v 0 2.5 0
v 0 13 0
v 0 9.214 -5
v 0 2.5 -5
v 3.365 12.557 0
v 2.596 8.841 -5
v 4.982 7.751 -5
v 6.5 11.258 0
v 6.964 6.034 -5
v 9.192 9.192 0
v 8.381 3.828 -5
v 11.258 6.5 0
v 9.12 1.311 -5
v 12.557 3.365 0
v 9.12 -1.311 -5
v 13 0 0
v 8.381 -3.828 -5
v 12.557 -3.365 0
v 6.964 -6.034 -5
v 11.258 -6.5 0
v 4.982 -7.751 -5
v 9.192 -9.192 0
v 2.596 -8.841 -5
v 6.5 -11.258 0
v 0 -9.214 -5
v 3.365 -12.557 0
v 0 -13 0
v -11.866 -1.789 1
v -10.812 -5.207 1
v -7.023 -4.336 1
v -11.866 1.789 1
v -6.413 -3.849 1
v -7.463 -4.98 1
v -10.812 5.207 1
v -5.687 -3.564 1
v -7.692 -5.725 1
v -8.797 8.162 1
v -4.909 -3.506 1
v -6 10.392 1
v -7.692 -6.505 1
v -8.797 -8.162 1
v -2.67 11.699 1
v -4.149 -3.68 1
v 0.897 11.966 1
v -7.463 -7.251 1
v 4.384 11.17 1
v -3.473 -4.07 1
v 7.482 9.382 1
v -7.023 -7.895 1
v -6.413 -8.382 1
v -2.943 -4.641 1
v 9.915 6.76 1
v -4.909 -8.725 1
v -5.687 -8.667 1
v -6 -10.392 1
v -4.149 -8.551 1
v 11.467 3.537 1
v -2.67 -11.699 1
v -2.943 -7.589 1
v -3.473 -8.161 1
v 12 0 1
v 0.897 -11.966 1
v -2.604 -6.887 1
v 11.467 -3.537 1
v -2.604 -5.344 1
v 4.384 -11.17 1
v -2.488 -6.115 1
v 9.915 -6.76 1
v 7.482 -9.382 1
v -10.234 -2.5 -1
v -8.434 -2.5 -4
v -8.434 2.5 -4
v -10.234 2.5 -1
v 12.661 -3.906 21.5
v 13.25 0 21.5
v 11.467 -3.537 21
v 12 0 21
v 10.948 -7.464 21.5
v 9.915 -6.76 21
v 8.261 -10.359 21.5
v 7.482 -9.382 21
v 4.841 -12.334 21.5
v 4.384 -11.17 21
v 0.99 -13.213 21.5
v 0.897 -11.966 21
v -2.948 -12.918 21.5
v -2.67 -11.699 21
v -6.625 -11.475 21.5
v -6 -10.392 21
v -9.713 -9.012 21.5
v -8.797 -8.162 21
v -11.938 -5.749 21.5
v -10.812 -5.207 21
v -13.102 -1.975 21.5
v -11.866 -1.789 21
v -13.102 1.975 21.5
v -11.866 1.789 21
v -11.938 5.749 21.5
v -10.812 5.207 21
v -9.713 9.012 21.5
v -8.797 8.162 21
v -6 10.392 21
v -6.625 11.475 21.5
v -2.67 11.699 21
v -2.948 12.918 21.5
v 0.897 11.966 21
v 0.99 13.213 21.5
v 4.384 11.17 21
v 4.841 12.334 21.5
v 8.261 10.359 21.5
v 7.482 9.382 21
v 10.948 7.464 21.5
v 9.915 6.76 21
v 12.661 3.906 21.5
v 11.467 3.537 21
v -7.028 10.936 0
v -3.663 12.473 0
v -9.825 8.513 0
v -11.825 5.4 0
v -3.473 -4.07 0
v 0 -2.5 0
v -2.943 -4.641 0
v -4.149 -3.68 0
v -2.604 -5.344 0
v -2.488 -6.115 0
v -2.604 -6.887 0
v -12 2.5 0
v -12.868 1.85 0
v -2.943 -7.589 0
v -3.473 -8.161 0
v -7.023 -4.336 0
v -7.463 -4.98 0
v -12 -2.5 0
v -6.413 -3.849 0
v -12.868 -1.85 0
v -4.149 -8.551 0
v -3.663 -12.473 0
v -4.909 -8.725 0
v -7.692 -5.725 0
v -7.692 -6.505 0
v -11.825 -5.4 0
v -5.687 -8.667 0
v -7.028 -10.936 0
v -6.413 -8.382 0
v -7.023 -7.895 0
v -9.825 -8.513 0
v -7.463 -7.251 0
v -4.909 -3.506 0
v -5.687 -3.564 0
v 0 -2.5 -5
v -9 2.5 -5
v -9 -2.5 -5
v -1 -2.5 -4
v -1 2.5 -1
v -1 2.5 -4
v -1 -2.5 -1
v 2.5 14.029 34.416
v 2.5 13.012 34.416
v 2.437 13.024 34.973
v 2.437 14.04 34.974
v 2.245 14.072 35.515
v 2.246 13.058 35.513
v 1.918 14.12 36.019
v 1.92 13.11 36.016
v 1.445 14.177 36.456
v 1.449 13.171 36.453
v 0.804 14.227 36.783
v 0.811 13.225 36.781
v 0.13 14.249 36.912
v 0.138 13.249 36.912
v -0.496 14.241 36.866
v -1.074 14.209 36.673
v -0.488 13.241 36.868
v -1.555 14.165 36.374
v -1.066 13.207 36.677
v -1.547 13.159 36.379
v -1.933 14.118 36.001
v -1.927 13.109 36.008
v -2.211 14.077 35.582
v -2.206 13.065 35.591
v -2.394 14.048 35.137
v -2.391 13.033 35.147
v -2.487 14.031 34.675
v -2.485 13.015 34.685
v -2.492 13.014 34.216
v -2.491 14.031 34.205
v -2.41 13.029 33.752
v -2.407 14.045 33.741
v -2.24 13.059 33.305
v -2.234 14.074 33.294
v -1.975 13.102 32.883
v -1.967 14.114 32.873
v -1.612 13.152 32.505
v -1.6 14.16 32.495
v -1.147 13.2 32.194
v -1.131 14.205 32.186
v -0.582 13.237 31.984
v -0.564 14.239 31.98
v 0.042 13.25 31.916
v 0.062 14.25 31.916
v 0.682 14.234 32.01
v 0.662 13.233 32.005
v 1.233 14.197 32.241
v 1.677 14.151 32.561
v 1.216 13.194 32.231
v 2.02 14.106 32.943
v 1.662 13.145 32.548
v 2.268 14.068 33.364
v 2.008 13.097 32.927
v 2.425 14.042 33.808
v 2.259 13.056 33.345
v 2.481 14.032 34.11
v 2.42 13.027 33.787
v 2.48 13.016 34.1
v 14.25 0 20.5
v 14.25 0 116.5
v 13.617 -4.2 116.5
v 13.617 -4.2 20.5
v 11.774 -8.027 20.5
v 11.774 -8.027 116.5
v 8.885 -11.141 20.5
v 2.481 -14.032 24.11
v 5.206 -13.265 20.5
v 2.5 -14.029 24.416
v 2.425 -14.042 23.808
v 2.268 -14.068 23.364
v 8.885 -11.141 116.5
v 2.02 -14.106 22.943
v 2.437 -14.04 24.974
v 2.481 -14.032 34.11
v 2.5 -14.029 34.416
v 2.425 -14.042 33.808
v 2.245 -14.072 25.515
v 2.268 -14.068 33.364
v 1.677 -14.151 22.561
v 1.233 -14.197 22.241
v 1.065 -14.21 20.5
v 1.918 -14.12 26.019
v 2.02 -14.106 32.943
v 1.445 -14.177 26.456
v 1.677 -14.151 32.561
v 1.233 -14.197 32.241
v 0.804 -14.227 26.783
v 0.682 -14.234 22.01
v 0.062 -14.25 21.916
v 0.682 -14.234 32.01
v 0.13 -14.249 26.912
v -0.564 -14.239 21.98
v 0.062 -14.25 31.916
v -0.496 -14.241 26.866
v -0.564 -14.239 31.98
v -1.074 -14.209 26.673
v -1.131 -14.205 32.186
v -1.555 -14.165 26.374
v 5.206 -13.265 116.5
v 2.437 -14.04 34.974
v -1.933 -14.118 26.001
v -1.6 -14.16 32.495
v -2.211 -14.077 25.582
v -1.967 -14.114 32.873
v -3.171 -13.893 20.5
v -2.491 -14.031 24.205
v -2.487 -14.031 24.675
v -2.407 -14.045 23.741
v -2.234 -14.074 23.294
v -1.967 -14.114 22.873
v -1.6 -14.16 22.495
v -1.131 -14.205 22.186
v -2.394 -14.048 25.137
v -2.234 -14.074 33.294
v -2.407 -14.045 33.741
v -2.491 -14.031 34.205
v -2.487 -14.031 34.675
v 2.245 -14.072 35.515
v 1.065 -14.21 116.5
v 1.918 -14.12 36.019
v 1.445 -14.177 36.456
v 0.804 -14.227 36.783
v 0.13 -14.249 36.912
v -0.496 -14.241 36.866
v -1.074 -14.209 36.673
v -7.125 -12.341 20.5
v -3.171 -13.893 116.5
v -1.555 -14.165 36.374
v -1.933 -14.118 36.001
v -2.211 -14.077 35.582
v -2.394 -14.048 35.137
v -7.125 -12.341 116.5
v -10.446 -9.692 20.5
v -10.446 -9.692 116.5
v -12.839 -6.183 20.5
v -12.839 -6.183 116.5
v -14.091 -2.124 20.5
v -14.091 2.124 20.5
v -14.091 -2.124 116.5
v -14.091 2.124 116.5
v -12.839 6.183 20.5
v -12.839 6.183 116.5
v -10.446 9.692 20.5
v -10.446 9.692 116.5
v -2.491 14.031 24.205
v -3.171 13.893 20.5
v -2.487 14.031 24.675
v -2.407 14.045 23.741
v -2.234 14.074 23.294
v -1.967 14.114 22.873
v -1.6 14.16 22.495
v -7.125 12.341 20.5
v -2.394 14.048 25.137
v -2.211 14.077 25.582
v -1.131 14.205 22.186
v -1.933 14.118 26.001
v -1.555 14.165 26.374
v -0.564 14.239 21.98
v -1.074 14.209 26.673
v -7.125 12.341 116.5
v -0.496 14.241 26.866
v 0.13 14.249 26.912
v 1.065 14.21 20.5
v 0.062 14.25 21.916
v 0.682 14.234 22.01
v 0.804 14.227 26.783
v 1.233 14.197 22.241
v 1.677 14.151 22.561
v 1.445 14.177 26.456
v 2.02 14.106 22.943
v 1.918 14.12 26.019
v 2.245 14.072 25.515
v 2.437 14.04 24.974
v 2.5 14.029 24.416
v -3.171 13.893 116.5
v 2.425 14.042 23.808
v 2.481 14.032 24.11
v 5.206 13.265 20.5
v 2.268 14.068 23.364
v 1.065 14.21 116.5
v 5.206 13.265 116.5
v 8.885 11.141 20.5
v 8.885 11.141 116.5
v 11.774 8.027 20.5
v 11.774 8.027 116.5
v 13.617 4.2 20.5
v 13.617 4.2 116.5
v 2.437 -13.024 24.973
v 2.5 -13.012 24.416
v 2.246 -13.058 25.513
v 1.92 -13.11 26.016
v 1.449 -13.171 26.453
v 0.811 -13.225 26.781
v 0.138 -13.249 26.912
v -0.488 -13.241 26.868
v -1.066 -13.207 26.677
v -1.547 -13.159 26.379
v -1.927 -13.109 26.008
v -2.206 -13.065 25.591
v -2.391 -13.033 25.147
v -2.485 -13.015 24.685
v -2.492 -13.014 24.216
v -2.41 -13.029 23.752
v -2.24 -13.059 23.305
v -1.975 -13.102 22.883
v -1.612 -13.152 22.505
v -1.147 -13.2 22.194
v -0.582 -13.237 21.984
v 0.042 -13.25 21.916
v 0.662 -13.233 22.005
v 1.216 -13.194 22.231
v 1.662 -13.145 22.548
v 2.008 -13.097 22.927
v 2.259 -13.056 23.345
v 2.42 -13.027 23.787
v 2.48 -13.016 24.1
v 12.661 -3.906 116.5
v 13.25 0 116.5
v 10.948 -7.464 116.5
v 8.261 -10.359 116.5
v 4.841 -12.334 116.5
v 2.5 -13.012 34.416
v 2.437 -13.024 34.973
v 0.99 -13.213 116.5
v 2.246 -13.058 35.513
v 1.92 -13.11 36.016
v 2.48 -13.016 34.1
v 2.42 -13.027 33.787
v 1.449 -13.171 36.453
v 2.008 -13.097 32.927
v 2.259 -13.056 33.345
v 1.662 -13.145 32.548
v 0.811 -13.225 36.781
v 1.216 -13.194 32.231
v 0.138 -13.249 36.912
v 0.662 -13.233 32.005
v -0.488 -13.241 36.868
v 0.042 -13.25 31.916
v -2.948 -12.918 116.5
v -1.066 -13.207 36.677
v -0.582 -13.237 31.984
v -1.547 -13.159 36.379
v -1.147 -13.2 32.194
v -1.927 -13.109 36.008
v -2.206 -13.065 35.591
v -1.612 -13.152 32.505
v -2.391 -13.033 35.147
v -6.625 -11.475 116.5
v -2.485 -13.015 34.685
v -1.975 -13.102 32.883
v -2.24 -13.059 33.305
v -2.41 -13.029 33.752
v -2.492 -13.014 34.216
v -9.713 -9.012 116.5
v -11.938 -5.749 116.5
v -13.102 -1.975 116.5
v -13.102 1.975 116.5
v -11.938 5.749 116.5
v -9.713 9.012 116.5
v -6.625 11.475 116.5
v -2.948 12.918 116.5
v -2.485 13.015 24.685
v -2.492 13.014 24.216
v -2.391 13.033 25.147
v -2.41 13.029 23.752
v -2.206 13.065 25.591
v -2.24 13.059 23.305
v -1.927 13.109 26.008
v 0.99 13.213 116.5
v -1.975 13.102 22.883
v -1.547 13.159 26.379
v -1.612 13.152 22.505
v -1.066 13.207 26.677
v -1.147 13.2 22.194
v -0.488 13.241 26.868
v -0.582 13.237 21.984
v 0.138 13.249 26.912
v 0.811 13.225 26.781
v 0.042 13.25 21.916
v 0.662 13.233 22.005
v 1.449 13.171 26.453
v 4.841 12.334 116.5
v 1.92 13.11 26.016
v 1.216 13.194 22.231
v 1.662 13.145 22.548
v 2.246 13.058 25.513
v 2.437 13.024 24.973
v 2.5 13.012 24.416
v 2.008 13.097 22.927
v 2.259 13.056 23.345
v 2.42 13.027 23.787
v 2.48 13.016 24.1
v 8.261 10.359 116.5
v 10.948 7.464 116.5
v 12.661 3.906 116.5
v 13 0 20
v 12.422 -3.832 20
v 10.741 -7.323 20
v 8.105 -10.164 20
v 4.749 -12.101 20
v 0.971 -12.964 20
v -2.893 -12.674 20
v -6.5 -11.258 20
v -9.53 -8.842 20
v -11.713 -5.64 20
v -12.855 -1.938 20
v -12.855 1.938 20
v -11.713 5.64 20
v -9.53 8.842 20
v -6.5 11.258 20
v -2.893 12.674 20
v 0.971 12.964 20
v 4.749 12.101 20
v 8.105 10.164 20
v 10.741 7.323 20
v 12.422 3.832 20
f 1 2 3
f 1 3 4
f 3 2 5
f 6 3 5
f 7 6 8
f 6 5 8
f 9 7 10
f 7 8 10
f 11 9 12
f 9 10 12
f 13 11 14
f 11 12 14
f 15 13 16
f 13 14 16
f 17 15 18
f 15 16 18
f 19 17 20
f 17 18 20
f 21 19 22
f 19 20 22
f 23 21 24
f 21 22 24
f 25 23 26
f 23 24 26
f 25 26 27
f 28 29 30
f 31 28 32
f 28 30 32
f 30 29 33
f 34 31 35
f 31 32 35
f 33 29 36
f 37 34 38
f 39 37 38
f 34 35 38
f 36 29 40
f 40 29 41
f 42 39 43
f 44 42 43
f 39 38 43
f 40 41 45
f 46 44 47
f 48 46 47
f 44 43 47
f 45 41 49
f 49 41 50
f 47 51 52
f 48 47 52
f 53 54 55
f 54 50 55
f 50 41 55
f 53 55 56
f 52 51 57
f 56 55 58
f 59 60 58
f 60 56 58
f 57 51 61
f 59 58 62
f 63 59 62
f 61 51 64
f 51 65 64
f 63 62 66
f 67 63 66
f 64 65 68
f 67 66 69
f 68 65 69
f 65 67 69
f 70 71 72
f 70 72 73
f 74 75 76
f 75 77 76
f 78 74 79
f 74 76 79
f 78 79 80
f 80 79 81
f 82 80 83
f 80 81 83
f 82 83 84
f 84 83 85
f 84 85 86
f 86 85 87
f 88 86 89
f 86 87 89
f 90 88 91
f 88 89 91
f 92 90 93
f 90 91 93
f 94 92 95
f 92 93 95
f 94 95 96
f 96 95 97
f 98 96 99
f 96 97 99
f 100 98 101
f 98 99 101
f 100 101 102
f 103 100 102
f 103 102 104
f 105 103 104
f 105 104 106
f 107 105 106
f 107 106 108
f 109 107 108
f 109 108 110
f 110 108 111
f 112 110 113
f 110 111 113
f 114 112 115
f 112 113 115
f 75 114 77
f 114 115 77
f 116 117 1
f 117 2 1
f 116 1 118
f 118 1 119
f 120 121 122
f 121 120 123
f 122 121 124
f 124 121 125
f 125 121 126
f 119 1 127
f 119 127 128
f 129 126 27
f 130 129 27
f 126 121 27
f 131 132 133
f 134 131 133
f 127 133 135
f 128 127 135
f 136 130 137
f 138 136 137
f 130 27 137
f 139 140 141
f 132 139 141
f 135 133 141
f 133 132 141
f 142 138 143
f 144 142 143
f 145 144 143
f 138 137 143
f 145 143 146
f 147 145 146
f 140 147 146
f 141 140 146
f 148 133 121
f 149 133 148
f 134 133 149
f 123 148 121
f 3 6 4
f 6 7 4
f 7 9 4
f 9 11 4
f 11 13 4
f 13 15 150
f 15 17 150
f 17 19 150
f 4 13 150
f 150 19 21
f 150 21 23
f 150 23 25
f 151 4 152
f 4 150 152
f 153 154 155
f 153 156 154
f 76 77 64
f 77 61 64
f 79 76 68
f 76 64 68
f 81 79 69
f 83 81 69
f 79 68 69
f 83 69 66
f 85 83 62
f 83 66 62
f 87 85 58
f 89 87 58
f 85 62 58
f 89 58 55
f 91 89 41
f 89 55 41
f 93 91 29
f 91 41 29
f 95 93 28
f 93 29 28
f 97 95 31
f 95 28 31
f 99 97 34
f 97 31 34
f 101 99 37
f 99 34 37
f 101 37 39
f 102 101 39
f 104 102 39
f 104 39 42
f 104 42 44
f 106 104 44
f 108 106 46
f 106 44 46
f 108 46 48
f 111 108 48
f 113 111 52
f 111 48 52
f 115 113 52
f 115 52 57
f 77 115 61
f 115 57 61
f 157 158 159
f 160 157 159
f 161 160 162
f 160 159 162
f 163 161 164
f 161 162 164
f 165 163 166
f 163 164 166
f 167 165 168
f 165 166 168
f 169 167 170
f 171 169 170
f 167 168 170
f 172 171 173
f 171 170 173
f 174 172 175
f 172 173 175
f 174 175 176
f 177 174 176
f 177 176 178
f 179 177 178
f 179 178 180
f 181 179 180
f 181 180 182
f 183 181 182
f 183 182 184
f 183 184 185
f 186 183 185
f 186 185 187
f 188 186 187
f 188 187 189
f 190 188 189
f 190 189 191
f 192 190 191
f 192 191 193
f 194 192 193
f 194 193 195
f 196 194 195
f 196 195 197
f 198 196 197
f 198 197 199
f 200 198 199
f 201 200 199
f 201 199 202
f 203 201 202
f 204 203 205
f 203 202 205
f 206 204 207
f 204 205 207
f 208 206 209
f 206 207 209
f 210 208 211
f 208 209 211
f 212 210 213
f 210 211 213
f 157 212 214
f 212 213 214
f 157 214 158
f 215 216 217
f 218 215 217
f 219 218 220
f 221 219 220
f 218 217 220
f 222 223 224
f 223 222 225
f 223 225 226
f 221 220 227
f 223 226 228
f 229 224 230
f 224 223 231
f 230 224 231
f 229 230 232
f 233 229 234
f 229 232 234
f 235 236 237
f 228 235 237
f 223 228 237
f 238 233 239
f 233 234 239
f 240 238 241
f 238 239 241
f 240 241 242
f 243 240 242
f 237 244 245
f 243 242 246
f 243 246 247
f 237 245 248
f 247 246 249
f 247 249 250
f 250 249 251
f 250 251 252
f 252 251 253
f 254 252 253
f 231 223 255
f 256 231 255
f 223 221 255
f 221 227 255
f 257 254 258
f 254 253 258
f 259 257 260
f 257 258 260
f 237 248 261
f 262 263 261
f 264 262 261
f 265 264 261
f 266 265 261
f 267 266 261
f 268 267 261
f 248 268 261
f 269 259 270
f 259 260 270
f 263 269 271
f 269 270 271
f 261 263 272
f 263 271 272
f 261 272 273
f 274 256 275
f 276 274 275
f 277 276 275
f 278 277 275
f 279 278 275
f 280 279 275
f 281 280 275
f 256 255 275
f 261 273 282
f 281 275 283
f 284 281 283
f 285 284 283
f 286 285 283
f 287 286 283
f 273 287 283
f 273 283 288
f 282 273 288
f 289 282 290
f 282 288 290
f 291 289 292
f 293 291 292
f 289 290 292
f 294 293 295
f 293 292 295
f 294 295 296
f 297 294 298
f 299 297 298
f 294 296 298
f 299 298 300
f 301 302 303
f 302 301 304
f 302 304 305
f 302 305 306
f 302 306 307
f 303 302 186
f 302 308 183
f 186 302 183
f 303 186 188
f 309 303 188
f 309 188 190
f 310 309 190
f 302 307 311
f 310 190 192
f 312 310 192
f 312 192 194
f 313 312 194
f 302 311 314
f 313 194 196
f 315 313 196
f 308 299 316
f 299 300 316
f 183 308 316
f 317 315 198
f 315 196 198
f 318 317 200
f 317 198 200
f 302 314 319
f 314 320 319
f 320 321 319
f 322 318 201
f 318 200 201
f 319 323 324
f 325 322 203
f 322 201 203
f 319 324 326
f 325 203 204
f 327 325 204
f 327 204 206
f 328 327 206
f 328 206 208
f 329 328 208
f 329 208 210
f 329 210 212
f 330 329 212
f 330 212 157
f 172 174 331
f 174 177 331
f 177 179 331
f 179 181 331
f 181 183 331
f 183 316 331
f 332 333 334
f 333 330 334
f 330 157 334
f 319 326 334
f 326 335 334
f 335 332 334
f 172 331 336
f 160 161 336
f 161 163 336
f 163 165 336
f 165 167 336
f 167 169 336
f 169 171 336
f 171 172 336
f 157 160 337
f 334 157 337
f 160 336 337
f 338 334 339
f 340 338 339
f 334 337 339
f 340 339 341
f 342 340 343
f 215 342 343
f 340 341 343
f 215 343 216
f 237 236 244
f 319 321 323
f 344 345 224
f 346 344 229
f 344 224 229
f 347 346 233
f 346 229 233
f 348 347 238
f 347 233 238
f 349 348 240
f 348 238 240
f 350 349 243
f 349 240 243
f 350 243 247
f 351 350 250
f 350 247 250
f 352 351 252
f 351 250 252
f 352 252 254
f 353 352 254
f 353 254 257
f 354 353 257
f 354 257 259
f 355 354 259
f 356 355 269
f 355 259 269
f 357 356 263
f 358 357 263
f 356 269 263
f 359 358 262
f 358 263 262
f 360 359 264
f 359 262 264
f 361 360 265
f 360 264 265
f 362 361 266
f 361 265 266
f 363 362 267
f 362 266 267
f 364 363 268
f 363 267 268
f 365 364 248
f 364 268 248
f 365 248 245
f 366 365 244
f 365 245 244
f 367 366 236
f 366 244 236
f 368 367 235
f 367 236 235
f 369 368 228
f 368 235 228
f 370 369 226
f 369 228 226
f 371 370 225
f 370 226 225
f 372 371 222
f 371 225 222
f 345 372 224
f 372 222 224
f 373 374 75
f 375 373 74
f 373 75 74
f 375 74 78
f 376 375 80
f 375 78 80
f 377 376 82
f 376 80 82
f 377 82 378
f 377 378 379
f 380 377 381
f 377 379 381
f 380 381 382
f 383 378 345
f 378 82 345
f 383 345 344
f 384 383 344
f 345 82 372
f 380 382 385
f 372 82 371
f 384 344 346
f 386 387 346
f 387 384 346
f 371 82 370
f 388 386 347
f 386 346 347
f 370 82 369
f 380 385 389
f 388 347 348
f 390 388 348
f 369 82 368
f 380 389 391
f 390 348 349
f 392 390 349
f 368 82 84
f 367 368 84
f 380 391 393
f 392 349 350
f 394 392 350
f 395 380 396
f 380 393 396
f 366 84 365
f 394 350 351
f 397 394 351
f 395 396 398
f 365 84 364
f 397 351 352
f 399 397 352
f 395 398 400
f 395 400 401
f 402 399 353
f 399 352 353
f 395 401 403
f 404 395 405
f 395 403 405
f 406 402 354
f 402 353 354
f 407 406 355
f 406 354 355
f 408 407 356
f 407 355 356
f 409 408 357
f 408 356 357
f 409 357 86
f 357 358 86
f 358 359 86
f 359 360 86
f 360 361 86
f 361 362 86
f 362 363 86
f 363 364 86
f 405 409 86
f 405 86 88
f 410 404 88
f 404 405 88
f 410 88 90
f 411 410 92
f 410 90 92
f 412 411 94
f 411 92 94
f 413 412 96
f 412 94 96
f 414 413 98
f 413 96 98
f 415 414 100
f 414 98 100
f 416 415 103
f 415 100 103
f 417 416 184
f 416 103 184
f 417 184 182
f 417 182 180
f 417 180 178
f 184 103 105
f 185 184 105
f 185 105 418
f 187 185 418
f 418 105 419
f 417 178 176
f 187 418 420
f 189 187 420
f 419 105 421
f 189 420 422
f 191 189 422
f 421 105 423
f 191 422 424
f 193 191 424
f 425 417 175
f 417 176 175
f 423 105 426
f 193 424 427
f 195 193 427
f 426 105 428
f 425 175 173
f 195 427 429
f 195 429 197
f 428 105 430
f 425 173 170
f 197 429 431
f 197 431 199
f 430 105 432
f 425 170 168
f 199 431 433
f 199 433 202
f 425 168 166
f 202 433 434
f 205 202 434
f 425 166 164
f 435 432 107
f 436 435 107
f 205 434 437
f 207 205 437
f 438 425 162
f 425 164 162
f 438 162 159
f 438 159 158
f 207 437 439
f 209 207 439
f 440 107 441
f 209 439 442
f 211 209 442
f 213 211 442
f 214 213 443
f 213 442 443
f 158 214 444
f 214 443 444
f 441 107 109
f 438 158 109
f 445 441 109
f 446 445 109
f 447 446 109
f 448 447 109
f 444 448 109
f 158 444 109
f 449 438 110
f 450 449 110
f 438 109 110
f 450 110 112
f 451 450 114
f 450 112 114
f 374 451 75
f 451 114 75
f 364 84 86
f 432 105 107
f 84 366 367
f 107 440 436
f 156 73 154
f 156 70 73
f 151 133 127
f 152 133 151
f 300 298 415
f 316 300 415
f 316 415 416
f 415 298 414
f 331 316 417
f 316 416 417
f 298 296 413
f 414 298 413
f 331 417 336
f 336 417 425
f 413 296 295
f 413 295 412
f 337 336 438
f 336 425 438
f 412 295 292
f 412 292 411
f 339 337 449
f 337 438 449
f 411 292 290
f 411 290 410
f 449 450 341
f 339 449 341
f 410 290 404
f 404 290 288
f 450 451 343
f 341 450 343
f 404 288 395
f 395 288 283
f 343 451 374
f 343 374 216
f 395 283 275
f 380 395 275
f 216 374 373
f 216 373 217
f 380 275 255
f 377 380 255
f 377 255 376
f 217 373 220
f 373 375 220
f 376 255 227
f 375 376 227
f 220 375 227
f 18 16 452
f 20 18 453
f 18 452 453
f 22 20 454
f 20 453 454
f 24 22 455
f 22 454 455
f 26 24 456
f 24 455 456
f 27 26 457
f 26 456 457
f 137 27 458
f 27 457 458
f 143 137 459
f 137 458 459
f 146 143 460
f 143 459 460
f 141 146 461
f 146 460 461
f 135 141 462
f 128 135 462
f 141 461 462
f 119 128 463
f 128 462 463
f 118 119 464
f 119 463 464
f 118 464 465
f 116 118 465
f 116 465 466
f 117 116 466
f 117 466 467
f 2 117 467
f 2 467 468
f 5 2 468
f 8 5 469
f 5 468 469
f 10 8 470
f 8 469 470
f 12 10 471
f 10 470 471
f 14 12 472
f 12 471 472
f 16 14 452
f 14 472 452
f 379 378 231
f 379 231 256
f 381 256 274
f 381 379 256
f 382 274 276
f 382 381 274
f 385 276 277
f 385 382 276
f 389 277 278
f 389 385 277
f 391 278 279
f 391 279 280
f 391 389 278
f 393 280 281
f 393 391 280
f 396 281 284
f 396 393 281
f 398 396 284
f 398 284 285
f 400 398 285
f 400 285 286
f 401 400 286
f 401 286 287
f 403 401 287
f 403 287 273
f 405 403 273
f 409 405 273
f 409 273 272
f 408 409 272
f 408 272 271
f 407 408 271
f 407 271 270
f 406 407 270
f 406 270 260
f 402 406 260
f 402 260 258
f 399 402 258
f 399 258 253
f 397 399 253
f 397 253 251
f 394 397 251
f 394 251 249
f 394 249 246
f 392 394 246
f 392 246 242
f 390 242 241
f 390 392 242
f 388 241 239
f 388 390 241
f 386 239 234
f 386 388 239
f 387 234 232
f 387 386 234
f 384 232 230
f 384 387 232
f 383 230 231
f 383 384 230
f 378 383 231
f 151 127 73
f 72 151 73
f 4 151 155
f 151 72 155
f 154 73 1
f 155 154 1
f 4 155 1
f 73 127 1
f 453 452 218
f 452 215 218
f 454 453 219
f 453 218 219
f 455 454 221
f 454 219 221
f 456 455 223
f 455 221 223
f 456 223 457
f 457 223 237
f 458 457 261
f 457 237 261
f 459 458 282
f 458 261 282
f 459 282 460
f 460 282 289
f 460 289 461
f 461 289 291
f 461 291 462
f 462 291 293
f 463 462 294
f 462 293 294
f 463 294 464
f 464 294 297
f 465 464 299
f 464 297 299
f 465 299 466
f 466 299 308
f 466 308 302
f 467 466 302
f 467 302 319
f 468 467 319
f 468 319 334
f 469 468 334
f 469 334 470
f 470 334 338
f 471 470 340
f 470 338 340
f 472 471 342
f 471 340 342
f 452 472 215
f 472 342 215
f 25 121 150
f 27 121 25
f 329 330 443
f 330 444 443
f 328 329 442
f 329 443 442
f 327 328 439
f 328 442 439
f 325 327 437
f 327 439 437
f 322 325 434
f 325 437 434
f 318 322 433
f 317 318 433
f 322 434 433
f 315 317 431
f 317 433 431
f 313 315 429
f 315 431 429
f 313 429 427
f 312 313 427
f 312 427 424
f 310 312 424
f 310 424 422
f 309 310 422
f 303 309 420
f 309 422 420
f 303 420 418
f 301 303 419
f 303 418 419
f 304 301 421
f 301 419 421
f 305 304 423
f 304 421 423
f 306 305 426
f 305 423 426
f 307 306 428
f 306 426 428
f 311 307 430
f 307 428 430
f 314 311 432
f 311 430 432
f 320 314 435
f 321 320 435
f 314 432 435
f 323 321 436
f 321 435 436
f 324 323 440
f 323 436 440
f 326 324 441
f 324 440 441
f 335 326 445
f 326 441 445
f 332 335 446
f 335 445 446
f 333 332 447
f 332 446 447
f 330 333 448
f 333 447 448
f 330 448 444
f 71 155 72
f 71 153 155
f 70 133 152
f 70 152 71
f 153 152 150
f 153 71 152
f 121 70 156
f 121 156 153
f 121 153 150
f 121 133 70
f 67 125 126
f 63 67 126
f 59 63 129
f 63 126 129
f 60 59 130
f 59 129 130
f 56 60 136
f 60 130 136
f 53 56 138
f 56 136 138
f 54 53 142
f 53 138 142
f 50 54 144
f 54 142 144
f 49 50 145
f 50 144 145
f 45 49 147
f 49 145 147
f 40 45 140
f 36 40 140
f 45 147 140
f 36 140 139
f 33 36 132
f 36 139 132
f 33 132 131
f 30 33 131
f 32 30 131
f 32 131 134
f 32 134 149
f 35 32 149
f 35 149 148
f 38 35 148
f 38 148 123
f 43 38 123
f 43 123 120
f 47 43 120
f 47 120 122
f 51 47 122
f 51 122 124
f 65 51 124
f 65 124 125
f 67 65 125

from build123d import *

# Parameters (mm, degrees)
F2_ANGLE = 180
F3_DEPTH = 2.5
F4_R     = 2.616774
F5_DEPTH = 25
F6_R     = 2.5
F7_DEPTH = 25


with BuildPart() as f1:
    # F0 (on Front) → F1 (revolve)
    with BuildSketch(Plane.XZ):
        Polygon((0, 1), (0, 0), (13, 0), (13, 20), (14.25, 20.5), (14.25, 116.5), (13.25, 116.5), (13.25, 21.5), (12, 21), (12, 1), align=None)
    revolve(axis=Axis((0, 0, 0.5), (0, 0, -1)))

    # F0 (on Front) → F2 (revolve, symmetric)
    with BuildSketch(Plane.XZ) as f2_sk:
        Polygon((13, 0), (0, 0), (0, -5), (9.214125, -5), align=None)
    revolve(axis=Axis((0, 0, -2.5), (0, 0, 1)), revolution_arc=F2_ANGLE / 2)
    revolve(f2_sk.sketch, axis=Axis((0, 0, -2.5), (0, 0, -1)), revolution_arc=F2_ANGLE / 2)

    # F0 (on Front) → F3 (join, symmetric)
    with BuildSketch(Plane.XZ):
        Polygon((0, -5), (0, 0), (-12, 0), (-9, -5), align=None)
        Polygon((-8.43381, -4), (-10.23381, -1), (-1, -1), (-1, -4), align=None, mode=Mode.SUBTRACT)
    extrude(amount=F3_DEPTH, both=True)

    # F4 (on face) → F5 (cut)
    with BuildSketch(Plane(origin=(0, 0, 0), x_dir=(1, 0, 0), z_dir=(0, 0, -1))):
        with Locations((-5.104913, 6.11541)):
            Circle(F4_R)
    extrude(amount=-F5_DEPTH, mode=Mode.SUBTRACT)

    # F6 (on Front) → F7 (cut, symmetric)
    with BuildSketch(Plane.XZ):
        with Locations((0, 34.415651)):
            Circle(F6_R)
        with Locations((0, 24.415651)):
            Circle(F6_R)
    extrude(amount=F7_DEPTH, both=True, mode=Mode.SUBTRACT)


solid = f1.part
